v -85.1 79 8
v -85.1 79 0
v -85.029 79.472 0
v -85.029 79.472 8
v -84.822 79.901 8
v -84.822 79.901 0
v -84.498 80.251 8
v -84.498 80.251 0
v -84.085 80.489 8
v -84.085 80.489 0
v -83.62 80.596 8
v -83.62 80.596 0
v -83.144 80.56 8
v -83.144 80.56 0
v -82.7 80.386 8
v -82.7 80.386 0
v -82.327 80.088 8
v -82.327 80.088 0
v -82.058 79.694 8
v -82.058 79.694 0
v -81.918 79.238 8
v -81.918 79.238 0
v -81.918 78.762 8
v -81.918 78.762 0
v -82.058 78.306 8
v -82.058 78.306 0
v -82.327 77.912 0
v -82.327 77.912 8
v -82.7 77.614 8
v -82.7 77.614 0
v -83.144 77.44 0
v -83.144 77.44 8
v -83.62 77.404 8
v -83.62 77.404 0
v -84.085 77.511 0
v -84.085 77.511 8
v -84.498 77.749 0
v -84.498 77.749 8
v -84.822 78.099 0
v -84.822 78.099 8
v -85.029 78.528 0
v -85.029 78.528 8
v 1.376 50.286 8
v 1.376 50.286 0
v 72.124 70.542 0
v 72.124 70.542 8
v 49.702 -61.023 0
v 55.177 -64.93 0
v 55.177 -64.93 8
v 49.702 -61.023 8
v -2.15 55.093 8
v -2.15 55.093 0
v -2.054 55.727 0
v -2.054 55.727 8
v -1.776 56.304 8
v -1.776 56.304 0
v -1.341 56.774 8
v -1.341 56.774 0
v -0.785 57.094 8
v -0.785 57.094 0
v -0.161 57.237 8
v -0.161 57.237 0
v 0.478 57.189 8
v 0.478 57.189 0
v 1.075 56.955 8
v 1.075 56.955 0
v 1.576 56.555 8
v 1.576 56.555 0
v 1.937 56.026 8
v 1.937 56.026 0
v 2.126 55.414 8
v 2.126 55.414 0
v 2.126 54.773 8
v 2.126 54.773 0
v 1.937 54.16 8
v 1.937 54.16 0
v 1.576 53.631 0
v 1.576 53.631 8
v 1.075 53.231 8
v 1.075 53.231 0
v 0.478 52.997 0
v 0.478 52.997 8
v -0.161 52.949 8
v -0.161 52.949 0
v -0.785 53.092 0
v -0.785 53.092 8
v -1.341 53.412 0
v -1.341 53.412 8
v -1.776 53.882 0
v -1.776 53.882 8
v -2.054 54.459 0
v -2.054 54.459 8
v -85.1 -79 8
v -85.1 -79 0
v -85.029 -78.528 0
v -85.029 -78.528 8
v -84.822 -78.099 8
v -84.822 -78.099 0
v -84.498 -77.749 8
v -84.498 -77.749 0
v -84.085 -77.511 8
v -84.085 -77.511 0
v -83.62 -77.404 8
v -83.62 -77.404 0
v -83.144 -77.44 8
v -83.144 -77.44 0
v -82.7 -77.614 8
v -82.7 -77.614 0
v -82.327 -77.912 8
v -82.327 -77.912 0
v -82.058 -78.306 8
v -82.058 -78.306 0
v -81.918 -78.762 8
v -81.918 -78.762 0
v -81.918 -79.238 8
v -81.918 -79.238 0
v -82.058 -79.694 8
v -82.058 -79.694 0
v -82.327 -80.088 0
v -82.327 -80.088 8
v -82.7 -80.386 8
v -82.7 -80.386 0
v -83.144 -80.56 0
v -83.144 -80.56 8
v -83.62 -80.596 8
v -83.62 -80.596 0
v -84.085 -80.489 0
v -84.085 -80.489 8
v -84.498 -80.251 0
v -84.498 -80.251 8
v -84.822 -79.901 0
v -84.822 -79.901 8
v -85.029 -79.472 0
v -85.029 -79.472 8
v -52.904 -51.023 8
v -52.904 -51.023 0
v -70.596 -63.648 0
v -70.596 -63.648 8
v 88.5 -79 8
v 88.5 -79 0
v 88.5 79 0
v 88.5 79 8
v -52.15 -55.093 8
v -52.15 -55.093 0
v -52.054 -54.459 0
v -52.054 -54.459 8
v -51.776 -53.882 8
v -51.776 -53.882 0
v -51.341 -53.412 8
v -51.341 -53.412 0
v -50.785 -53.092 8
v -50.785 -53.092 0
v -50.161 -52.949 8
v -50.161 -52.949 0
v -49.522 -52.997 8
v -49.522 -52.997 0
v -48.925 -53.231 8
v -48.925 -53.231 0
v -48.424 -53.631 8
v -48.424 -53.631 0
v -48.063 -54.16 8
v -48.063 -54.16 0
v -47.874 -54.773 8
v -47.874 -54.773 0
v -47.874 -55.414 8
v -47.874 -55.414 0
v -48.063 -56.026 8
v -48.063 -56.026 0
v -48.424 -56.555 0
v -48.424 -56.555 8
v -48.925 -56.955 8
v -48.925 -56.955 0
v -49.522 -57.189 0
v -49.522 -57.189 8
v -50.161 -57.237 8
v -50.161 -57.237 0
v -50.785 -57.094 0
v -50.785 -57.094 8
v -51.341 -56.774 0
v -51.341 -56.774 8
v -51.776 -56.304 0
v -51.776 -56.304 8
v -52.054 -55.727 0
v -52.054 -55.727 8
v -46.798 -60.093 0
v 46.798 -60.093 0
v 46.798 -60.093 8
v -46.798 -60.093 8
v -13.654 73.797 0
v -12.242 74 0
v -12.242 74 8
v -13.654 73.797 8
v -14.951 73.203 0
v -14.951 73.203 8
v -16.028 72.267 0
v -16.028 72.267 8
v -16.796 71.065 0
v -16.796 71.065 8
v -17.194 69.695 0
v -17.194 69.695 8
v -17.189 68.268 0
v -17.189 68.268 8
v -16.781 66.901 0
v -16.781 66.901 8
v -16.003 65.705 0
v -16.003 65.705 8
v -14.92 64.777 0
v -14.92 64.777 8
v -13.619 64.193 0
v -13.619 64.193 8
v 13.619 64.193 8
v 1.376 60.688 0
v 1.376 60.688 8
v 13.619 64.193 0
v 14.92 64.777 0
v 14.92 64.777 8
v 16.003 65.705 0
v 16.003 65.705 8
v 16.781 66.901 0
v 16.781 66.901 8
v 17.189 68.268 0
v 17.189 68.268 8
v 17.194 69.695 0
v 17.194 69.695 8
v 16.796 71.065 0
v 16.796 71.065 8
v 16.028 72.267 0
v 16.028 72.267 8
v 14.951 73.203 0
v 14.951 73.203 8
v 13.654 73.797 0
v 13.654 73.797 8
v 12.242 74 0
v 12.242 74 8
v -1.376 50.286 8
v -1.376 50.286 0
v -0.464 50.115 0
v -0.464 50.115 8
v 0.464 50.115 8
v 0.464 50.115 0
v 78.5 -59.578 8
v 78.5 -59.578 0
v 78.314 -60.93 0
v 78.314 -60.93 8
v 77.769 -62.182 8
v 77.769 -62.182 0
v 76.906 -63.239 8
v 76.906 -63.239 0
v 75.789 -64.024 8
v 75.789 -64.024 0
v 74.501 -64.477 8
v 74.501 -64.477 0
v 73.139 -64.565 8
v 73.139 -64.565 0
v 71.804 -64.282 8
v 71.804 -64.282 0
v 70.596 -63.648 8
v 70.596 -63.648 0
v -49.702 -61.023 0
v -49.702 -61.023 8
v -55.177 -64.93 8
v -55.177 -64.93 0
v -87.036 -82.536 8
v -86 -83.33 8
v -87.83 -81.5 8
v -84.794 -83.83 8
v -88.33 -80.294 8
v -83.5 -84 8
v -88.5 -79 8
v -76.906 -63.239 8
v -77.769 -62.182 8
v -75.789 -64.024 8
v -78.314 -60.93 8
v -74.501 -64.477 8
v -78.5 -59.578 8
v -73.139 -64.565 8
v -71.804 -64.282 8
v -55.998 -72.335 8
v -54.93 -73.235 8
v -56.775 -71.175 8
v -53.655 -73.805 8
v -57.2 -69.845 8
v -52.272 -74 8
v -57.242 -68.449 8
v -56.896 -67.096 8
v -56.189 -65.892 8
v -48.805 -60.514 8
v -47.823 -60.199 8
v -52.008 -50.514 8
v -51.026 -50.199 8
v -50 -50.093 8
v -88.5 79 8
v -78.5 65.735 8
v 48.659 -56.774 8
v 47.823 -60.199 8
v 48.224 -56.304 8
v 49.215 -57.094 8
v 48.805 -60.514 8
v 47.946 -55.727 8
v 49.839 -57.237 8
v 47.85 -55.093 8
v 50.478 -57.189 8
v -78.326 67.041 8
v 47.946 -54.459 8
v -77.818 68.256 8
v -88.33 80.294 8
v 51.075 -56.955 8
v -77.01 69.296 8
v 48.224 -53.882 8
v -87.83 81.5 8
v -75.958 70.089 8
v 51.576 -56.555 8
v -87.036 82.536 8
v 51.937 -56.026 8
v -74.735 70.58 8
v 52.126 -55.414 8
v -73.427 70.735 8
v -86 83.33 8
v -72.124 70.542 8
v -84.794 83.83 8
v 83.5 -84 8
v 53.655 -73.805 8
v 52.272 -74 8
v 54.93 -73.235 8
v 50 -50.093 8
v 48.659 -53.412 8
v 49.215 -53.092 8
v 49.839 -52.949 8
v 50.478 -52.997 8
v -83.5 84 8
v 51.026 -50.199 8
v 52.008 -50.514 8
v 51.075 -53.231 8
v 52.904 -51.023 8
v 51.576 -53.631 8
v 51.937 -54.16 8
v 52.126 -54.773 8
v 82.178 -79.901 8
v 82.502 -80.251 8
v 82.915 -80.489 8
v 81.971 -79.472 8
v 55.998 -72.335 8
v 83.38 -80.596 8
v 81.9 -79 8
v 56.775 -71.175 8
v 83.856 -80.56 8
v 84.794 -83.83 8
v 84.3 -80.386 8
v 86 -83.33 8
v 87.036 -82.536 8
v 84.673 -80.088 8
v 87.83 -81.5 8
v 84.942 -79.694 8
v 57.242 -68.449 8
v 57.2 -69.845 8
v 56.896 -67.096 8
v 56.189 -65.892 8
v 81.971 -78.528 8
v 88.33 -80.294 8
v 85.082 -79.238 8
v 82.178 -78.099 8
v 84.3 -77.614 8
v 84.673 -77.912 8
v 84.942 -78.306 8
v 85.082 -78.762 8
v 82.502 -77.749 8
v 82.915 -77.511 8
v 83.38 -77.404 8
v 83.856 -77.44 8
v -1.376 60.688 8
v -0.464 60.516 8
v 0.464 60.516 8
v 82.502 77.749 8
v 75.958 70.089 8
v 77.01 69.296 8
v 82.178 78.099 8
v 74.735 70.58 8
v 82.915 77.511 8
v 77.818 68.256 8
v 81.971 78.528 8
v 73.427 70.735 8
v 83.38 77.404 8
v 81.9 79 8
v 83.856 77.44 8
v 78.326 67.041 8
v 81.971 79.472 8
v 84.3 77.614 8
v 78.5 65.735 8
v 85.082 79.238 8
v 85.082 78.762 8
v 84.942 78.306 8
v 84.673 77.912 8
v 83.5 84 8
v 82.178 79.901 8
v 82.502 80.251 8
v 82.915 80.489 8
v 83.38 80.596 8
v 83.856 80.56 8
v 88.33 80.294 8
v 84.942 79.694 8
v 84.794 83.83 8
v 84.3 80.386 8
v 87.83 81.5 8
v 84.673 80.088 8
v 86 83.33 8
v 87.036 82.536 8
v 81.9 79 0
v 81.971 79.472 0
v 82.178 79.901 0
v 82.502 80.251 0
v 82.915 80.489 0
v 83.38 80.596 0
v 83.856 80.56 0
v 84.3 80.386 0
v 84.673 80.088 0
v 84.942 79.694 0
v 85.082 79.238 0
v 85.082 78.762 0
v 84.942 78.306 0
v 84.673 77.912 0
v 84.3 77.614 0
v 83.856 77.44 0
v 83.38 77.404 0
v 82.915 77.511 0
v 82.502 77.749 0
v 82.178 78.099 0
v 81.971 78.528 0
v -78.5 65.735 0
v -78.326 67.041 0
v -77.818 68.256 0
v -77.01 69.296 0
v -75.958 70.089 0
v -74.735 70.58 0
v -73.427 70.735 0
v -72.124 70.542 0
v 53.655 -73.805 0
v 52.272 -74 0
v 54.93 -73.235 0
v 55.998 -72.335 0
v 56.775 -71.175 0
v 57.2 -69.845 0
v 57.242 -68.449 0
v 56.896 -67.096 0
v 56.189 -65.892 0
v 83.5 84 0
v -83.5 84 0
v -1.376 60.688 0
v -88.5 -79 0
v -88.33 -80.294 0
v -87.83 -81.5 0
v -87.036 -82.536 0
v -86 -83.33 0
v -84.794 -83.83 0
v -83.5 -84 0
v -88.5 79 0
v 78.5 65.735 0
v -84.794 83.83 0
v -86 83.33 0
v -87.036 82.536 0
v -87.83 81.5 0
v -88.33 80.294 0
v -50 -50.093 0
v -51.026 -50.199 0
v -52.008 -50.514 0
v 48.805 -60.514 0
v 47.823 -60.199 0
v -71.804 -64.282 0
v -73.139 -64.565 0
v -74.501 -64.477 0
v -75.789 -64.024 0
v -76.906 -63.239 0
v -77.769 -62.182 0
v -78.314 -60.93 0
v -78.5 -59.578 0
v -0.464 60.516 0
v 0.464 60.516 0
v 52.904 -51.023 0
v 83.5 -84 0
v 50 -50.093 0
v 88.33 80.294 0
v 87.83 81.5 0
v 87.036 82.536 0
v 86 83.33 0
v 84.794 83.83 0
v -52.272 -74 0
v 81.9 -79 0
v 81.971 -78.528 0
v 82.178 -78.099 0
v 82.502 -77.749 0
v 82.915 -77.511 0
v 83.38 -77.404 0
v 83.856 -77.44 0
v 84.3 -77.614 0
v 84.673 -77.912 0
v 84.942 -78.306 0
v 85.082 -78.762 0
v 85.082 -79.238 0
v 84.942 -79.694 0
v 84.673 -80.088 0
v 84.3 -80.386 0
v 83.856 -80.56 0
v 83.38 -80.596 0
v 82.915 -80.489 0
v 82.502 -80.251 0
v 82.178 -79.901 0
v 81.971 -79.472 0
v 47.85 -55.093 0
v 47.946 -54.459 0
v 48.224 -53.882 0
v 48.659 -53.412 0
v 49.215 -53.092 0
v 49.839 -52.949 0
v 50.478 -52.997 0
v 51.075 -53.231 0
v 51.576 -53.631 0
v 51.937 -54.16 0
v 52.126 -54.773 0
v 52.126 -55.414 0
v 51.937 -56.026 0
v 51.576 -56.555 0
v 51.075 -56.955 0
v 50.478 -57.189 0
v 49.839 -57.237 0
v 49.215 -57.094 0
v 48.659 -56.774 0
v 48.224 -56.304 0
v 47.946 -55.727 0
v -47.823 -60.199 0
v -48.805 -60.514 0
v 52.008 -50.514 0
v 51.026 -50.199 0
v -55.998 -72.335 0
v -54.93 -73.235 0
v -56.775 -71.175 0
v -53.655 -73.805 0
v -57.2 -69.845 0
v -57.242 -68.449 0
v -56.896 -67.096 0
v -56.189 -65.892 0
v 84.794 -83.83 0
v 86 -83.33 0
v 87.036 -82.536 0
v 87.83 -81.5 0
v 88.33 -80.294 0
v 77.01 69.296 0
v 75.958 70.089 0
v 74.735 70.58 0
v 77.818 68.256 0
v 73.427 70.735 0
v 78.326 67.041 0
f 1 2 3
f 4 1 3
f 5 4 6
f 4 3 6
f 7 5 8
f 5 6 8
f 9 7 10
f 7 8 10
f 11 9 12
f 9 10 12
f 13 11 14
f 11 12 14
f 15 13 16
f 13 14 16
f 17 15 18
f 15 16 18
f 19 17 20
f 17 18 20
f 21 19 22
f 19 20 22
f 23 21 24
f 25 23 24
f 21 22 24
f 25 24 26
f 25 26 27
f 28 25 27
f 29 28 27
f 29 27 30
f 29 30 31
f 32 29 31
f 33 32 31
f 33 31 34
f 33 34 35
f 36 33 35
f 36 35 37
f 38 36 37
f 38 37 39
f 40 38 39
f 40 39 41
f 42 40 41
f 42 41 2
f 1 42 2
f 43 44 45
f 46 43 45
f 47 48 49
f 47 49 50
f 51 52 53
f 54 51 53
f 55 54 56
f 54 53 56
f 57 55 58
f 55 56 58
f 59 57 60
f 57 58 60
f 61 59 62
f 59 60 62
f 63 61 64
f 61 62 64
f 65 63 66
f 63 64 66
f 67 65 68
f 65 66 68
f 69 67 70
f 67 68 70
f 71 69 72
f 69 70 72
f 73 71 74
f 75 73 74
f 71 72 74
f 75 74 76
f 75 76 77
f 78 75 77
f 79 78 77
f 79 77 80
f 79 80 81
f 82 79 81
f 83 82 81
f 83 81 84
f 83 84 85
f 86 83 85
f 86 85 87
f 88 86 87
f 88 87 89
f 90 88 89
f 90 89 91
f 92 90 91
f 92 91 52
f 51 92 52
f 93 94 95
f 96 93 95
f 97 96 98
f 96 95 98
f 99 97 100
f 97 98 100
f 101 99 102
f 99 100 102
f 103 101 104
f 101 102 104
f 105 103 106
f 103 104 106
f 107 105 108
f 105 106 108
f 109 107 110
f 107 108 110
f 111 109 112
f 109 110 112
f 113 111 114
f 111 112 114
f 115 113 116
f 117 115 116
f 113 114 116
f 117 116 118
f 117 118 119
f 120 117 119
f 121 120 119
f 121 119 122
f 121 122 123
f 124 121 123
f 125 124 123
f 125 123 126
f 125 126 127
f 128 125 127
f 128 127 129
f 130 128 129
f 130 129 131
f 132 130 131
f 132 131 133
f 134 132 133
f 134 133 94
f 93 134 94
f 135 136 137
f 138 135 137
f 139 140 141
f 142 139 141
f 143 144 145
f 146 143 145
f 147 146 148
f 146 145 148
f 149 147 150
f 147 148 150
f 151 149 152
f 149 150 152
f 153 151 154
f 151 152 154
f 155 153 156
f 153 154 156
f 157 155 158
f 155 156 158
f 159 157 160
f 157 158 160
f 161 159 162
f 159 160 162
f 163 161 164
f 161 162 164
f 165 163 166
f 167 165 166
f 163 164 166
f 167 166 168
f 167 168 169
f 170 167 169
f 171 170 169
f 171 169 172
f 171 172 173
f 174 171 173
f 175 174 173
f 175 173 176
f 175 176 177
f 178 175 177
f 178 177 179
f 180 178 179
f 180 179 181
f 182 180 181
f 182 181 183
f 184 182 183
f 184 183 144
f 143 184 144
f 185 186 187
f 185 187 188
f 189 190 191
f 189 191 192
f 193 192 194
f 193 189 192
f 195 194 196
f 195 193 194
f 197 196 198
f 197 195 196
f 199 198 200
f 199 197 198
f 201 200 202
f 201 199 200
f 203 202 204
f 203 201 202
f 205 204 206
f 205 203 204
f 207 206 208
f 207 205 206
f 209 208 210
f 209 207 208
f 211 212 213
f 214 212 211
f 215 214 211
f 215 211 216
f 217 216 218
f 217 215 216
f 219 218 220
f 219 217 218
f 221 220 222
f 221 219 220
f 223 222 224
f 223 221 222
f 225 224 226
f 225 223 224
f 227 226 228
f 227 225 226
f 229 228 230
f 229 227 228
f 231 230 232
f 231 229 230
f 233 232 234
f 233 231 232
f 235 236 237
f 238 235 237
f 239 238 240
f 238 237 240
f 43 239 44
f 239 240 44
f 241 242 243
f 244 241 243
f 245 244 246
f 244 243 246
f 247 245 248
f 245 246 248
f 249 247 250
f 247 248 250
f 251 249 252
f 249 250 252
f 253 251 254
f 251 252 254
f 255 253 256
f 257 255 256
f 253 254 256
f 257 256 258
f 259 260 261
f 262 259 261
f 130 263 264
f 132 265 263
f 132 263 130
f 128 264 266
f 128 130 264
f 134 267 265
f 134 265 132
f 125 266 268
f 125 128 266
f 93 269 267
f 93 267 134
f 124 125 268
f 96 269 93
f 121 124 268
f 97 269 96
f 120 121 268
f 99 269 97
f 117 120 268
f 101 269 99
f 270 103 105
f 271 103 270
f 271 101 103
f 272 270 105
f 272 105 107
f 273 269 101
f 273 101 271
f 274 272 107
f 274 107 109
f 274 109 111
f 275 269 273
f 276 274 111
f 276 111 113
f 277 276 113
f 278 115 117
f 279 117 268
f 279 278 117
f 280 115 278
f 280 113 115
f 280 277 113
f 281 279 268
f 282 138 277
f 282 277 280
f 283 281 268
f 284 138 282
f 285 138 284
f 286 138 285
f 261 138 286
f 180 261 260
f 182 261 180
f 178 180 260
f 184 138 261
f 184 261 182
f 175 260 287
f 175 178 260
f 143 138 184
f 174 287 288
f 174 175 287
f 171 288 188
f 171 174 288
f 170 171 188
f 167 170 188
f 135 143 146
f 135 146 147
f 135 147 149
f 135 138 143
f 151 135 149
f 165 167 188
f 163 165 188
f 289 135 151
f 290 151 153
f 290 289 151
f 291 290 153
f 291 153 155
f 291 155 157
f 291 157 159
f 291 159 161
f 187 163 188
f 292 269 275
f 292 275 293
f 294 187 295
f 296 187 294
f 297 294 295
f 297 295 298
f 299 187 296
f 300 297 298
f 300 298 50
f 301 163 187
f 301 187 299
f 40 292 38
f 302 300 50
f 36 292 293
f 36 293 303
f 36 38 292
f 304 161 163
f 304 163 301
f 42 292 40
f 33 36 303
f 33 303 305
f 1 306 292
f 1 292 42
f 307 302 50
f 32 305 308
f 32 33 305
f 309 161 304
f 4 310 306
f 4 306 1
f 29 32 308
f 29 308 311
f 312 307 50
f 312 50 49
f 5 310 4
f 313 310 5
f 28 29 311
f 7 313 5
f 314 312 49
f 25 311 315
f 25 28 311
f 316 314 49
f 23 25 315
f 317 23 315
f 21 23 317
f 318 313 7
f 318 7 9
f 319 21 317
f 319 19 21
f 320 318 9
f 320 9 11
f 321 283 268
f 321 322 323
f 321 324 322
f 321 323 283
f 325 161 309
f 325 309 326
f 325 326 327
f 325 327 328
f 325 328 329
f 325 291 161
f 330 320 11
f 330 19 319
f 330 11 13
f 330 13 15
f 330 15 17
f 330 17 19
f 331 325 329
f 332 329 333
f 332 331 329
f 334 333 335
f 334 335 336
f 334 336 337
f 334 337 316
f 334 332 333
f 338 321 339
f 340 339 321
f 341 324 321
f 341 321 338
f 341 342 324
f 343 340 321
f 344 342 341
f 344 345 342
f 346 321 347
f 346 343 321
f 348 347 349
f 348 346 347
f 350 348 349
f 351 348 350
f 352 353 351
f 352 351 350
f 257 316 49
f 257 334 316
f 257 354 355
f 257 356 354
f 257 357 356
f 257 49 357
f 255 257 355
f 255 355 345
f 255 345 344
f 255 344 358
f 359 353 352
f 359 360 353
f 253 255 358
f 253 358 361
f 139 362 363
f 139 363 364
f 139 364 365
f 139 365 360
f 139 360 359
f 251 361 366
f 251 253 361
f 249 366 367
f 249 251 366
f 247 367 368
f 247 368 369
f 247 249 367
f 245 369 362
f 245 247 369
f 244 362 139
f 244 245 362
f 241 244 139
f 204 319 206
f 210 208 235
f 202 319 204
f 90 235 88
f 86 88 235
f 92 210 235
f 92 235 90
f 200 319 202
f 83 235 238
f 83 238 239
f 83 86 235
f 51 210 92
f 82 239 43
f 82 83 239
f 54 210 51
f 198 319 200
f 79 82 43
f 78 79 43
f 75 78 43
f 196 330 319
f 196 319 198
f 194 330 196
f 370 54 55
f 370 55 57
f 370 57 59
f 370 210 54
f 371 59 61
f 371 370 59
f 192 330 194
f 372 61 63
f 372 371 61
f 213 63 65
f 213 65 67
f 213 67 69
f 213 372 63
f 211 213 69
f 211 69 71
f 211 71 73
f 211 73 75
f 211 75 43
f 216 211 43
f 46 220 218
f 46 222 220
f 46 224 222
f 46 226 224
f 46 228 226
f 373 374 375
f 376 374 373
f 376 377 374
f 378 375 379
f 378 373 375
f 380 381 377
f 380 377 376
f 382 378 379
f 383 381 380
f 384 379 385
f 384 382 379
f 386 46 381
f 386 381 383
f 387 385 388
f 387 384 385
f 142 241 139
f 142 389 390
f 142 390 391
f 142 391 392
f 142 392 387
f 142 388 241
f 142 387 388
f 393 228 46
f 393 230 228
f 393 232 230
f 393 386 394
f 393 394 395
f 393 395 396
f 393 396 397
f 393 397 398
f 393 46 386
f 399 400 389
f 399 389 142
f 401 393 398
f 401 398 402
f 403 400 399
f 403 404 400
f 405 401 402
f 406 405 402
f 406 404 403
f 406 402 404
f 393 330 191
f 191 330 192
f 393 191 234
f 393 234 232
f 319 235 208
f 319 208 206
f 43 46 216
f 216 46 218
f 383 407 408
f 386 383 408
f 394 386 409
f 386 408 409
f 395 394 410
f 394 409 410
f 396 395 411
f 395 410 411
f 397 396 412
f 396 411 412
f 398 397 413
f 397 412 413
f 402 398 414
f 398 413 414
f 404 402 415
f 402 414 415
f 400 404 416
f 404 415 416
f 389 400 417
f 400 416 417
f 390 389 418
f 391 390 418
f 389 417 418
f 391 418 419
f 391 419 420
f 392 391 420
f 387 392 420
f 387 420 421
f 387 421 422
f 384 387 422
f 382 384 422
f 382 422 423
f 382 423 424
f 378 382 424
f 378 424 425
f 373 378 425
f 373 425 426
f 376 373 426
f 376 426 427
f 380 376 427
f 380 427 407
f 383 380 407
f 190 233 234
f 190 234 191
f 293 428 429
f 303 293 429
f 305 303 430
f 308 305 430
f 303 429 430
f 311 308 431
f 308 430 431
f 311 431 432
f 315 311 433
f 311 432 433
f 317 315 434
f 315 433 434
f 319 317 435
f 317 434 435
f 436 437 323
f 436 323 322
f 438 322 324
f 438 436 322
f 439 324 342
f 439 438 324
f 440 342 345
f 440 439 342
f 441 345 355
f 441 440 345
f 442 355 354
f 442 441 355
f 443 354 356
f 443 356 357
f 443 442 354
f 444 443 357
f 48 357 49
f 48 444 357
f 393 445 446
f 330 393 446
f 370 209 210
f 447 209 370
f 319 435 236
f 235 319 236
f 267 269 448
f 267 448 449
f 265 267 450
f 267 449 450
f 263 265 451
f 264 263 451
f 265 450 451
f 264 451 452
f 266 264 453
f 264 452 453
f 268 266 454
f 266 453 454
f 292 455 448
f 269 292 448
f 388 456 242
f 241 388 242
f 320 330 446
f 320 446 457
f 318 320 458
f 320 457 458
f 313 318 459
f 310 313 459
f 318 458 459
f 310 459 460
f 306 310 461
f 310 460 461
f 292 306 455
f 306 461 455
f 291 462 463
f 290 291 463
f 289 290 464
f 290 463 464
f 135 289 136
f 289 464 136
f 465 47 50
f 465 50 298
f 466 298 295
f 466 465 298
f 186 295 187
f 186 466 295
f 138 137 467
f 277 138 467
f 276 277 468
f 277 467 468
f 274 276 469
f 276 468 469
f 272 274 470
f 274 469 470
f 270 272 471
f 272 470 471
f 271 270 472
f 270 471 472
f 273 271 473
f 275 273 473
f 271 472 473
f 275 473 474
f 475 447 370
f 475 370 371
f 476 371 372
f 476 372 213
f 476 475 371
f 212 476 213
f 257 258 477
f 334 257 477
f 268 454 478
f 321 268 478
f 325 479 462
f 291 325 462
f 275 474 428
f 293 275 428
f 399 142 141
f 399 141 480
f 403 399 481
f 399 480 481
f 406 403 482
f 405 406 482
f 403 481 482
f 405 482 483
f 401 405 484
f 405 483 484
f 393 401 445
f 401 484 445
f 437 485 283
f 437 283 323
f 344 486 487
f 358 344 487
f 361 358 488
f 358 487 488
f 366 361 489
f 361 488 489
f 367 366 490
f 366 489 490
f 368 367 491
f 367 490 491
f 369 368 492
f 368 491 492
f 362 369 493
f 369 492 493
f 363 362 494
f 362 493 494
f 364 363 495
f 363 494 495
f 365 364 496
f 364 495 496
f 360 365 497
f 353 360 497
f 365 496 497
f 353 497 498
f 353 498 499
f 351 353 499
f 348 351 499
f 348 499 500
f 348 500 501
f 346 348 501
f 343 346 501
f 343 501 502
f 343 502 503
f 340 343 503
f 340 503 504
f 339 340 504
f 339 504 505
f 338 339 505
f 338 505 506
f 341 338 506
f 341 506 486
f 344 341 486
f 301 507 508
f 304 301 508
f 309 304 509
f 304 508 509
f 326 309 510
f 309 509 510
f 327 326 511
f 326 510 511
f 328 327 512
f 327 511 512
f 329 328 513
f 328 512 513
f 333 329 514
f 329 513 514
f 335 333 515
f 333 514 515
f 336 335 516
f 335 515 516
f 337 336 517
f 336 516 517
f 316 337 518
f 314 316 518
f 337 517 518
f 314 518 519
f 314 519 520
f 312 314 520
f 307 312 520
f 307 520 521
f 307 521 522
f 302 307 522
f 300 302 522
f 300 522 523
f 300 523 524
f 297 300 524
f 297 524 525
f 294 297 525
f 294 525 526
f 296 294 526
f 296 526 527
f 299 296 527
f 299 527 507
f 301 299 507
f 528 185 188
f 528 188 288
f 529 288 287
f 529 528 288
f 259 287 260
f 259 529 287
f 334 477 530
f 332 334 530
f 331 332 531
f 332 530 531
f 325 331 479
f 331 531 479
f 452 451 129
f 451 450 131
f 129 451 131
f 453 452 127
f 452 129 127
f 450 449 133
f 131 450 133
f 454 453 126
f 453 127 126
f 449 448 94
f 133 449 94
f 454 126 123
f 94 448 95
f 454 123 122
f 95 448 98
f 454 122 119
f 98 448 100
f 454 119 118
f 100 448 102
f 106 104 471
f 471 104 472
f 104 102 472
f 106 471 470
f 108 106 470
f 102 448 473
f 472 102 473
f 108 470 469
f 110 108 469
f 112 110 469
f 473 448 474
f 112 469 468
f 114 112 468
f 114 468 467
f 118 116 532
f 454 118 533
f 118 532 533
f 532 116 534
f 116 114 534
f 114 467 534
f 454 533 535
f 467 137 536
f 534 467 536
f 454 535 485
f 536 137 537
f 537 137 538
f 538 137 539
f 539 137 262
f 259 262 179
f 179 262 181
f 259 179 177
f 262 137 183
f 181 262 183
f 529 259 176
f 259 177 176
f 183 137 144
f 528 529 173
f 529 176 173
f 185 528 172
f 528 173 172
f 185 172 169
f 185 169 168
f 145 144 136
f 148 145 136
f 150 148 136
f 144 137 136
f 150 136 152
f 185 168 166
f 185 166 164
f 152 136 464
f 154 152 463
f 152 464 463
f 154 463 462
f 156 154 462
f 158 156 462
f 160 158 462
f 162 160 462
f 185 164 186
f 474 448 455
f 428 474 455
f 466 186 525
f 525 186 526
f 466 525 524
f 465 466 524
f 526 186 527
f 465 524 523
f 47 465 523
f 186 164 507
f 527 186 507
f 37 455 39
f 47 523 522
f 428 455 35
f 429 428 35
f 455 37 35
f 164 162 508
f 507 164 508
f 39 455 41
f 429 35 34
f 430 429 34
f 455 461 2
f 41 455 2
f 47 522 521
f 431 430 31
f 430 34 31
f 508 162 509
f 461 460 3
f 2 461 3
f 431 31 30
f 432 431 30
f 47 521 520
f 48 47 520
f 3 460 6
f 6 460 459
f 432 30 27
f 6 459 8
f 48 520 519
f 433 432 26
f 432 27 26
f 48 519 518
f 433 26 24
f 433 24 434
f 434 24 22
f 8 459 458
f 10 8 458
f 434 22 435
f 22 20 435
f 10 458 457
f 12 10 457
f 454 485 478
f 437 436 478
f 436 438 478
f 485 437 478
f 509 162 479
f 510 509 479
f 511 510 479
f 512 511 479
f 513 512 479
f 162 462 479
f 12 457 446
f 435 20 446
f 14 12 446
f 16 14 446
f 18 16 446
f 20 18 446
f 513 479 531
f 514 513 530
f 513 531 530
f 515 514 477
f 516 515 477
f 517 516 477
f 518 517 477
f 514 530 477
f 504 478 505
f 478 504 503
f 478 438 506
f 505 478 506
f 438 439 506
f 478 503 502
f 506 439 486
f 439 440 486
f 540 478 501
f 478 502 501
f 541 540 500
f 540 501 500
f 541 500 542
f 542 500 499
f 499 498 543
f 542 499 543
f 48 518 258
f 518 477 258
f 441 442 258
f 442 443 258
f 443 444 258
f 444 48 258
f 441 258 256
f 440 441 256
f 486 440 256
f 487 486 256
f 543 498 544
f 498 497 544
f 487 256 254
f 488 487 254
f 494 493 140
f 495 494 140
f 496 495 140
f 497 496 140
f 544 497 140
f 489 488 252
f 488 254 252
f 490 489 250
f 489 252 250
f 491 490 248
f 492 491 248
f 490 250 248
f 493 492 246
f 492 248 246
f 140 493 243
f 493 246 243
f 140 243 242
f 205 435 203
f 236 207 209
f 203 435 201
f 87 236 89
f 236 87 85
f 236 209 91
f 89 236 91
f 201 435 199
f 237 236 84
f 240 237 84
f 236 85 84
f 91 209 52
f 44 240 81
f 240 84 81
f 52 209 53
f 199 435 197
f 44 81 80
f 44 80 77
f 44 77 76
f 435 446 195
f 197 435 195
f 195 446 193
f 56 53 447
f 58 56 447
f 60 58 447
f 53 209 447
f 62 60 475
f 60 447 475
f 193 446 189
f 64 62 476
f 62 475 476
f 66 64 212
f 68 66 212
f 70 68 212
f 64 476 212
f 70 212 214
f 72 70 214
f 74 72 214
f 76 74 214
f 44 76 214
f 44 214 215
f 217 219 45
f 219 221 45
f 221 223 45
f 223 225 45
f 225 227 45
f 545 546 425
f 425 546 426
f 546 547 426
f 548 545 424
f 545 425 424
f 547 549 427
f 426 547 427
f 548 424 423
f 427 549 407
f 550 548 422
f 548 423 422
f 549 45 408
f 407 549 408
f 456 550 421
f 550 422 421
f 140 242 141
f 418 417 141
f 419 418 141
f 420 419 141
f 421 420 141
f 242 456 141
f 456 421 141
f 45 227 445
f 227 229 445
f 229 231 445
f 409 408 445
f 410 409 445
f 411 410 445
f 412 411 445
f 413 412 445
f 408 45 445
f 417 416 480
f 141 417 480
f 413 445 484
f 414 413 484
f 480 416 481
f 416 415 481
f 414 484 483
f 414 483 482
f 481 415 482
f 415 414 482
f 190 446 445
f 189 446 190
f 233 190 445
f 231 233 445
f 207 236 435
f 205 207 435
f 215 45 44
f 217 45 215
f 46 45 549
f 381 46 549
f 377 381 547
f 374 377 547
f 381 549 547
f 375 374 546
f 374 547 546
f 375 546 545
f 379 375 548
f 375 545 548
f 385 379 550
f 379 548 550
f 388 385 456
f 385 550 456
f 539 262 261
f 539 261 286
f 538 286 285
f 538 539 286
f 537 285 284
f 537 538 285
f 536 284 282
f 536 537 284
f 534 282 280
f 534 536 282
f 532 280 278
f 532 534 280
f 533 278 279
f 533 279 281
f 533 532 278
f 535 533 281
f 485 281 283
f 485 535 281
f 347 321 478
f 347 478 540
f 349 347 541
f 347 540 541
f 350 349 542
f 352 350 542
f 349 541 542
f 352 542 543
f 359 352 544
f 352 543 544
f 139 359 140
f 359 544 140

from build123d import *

# Parameters (mm, degrees)
BOSS_EXTRU_1_DEPTH = 8
D_GAGEMENT_M31_D   = 3.2
D_GAGEMENT_M41_D   = 4.3


with BuildPart() as part:
    # Esquisse1 → Boss.-Extru.1 (new body)
    with BuildSketch(Plane.XY):
        with BuildLine():
            Line((-83.5, -84), (83.5, -84))
            ThreePointArc((83.5, -84), (87.035533906, -82.535533906), (88.5, -79))
            Line((88.5, -79), (88.5, 79))
            ThreePointArc((88.5, 79), (87.035533906, 82.535533906), (83.5, 84))
            Line((83.5, 84), (-83.5, 84))
            ThreePointArc((-83.5, 84), (-87.035533906, 82.535533906), (-88.5, 79))
            Line((-88.5, 79), (-88.5, -79))
            ThreePointArc((-88.5, -79), (-87.035533906, -82.535533906), (-83.5, -84))
        make_face()
        with BuildLine():
            Line((-52.904447079, -51.023190589), (-70.595552921, -63.648248646))
            ThreePointArc((-70.595552921, -63.648248646), (-75.788860481, -64.02368409), (-78.5, -59.578336218))
            Line((-78.5, -59.578336218), (-78.5, 65.735103055))
            ThreePointArc((-78.5, 65.735103055), (-76.509878124, 69.727675368), (-72.123746529, 70.541965481))
            Line((-72.123746529, 70.541965481), (-1.376253471, 50.286240591))
            ThreePointArc((-1.376253471, 50.286240591), (0, 50.093103017), (1.376253471, 50.286240591))
            Line((1.376253471, 50.286240591), (72.123746529, 70.541965481))
            ThreePointArc((72.123746529, 70.541965481), (76.509878124, 69.727675368), (78.5, 65.735103055))
            Line((78.5, 65.735103055), (78.5, -59.578336218))
            ThreePointArc((78.5, -59.578336218), (75.788860481, -64.02368409), (70.595552921, -63.648248646))
            Line((70.595552921, -63.648248646), (52.904447079, -51.023190589))
            ThreePointArc((52.904447079, -51.023190589), (51.524866857, -50.331298625), (50, -50.093103017))
            Line((50, -50.093103017), (-50, -50.093103017))
            ThreePointArc((-50, -50.093103017), (-51.524866857, -50.331298625), (-52.904447079, -51.023190589))
        make_face(mode=Mode.SUBTRACT)
        with BuildLine():
            Line((-49.702159182, -61.023190589), (-55.176773853, -64.930087573))
            ThreePointArc((-55.176773853, -64.930087573), (-57.034131166, -70.524866857), (-52.272326774, -74))
            Line((-52.272326774, -74), (52.272326774, -74))
            ThreePointArc((52.272326774, -74), (57.034131166, -70.524866857), (55.176773853, -64.930087573))
            Line((55.176773853, -64.930087573), (49.702159182, -61.023190589))
            ThreePointArc((49.702159182, -61.023190589), (48.322578961, -60.331298625), (46.797712104, -60.093103017))
            Line((46.797712104, -60.093103017), (-46.797712104, -60.093103017))
            ThreePointArc((-46.797712104, -60.093103017), (-48.322578961, -60.331298625), (-49.702159182, -61.023190589))
        make_face(mode=Mode.SUBTRACT)
        with BuildLine():
            Line((-13.618577234, 64.193137574), (-1.376253471, 60.6880361))
            ThreePointArc((-1.376253471, 60.6880361), (0, 60.494898526), (1.376253471, 60.6880361))
            Line((1.376253471, 60.6880361), (13.618577234, 64.193137574))
            ThreePointArc((13.618577234, 64.193137574), (17.193803952, 69.694869725), (12.242323763, 74))
            Line((12.242323763, 74), (-12.242323763, 74))
            ThreePointArc((-12.242323763, 74), (-17.193803952, 69.694869725), (-13.618577234, 64.193137574))
        make_face(mode=Mode.SUBTRACT)
    extrude(amount=BOSS_EXTRU_1_DEPTH)

    # Dégagement M31 (through all)
    with Locations(Plane.XY.offset(8)):
        with Locations((-83.5, 79), (-83.5, -79), (83.5, -79), (83.5, 79)):
            Hole(D_GAGEMENT_M31_D / 2)

    # Dégagement M41 (through all)
    with Locations(Plane.XY.offset(8)):
        with Locations((-50, -55.093103017), (50, -55.093103017), (0, 55.093103017)):
            Hole(D_GAGEMENT_M41_D / 2)


solid = part.part
